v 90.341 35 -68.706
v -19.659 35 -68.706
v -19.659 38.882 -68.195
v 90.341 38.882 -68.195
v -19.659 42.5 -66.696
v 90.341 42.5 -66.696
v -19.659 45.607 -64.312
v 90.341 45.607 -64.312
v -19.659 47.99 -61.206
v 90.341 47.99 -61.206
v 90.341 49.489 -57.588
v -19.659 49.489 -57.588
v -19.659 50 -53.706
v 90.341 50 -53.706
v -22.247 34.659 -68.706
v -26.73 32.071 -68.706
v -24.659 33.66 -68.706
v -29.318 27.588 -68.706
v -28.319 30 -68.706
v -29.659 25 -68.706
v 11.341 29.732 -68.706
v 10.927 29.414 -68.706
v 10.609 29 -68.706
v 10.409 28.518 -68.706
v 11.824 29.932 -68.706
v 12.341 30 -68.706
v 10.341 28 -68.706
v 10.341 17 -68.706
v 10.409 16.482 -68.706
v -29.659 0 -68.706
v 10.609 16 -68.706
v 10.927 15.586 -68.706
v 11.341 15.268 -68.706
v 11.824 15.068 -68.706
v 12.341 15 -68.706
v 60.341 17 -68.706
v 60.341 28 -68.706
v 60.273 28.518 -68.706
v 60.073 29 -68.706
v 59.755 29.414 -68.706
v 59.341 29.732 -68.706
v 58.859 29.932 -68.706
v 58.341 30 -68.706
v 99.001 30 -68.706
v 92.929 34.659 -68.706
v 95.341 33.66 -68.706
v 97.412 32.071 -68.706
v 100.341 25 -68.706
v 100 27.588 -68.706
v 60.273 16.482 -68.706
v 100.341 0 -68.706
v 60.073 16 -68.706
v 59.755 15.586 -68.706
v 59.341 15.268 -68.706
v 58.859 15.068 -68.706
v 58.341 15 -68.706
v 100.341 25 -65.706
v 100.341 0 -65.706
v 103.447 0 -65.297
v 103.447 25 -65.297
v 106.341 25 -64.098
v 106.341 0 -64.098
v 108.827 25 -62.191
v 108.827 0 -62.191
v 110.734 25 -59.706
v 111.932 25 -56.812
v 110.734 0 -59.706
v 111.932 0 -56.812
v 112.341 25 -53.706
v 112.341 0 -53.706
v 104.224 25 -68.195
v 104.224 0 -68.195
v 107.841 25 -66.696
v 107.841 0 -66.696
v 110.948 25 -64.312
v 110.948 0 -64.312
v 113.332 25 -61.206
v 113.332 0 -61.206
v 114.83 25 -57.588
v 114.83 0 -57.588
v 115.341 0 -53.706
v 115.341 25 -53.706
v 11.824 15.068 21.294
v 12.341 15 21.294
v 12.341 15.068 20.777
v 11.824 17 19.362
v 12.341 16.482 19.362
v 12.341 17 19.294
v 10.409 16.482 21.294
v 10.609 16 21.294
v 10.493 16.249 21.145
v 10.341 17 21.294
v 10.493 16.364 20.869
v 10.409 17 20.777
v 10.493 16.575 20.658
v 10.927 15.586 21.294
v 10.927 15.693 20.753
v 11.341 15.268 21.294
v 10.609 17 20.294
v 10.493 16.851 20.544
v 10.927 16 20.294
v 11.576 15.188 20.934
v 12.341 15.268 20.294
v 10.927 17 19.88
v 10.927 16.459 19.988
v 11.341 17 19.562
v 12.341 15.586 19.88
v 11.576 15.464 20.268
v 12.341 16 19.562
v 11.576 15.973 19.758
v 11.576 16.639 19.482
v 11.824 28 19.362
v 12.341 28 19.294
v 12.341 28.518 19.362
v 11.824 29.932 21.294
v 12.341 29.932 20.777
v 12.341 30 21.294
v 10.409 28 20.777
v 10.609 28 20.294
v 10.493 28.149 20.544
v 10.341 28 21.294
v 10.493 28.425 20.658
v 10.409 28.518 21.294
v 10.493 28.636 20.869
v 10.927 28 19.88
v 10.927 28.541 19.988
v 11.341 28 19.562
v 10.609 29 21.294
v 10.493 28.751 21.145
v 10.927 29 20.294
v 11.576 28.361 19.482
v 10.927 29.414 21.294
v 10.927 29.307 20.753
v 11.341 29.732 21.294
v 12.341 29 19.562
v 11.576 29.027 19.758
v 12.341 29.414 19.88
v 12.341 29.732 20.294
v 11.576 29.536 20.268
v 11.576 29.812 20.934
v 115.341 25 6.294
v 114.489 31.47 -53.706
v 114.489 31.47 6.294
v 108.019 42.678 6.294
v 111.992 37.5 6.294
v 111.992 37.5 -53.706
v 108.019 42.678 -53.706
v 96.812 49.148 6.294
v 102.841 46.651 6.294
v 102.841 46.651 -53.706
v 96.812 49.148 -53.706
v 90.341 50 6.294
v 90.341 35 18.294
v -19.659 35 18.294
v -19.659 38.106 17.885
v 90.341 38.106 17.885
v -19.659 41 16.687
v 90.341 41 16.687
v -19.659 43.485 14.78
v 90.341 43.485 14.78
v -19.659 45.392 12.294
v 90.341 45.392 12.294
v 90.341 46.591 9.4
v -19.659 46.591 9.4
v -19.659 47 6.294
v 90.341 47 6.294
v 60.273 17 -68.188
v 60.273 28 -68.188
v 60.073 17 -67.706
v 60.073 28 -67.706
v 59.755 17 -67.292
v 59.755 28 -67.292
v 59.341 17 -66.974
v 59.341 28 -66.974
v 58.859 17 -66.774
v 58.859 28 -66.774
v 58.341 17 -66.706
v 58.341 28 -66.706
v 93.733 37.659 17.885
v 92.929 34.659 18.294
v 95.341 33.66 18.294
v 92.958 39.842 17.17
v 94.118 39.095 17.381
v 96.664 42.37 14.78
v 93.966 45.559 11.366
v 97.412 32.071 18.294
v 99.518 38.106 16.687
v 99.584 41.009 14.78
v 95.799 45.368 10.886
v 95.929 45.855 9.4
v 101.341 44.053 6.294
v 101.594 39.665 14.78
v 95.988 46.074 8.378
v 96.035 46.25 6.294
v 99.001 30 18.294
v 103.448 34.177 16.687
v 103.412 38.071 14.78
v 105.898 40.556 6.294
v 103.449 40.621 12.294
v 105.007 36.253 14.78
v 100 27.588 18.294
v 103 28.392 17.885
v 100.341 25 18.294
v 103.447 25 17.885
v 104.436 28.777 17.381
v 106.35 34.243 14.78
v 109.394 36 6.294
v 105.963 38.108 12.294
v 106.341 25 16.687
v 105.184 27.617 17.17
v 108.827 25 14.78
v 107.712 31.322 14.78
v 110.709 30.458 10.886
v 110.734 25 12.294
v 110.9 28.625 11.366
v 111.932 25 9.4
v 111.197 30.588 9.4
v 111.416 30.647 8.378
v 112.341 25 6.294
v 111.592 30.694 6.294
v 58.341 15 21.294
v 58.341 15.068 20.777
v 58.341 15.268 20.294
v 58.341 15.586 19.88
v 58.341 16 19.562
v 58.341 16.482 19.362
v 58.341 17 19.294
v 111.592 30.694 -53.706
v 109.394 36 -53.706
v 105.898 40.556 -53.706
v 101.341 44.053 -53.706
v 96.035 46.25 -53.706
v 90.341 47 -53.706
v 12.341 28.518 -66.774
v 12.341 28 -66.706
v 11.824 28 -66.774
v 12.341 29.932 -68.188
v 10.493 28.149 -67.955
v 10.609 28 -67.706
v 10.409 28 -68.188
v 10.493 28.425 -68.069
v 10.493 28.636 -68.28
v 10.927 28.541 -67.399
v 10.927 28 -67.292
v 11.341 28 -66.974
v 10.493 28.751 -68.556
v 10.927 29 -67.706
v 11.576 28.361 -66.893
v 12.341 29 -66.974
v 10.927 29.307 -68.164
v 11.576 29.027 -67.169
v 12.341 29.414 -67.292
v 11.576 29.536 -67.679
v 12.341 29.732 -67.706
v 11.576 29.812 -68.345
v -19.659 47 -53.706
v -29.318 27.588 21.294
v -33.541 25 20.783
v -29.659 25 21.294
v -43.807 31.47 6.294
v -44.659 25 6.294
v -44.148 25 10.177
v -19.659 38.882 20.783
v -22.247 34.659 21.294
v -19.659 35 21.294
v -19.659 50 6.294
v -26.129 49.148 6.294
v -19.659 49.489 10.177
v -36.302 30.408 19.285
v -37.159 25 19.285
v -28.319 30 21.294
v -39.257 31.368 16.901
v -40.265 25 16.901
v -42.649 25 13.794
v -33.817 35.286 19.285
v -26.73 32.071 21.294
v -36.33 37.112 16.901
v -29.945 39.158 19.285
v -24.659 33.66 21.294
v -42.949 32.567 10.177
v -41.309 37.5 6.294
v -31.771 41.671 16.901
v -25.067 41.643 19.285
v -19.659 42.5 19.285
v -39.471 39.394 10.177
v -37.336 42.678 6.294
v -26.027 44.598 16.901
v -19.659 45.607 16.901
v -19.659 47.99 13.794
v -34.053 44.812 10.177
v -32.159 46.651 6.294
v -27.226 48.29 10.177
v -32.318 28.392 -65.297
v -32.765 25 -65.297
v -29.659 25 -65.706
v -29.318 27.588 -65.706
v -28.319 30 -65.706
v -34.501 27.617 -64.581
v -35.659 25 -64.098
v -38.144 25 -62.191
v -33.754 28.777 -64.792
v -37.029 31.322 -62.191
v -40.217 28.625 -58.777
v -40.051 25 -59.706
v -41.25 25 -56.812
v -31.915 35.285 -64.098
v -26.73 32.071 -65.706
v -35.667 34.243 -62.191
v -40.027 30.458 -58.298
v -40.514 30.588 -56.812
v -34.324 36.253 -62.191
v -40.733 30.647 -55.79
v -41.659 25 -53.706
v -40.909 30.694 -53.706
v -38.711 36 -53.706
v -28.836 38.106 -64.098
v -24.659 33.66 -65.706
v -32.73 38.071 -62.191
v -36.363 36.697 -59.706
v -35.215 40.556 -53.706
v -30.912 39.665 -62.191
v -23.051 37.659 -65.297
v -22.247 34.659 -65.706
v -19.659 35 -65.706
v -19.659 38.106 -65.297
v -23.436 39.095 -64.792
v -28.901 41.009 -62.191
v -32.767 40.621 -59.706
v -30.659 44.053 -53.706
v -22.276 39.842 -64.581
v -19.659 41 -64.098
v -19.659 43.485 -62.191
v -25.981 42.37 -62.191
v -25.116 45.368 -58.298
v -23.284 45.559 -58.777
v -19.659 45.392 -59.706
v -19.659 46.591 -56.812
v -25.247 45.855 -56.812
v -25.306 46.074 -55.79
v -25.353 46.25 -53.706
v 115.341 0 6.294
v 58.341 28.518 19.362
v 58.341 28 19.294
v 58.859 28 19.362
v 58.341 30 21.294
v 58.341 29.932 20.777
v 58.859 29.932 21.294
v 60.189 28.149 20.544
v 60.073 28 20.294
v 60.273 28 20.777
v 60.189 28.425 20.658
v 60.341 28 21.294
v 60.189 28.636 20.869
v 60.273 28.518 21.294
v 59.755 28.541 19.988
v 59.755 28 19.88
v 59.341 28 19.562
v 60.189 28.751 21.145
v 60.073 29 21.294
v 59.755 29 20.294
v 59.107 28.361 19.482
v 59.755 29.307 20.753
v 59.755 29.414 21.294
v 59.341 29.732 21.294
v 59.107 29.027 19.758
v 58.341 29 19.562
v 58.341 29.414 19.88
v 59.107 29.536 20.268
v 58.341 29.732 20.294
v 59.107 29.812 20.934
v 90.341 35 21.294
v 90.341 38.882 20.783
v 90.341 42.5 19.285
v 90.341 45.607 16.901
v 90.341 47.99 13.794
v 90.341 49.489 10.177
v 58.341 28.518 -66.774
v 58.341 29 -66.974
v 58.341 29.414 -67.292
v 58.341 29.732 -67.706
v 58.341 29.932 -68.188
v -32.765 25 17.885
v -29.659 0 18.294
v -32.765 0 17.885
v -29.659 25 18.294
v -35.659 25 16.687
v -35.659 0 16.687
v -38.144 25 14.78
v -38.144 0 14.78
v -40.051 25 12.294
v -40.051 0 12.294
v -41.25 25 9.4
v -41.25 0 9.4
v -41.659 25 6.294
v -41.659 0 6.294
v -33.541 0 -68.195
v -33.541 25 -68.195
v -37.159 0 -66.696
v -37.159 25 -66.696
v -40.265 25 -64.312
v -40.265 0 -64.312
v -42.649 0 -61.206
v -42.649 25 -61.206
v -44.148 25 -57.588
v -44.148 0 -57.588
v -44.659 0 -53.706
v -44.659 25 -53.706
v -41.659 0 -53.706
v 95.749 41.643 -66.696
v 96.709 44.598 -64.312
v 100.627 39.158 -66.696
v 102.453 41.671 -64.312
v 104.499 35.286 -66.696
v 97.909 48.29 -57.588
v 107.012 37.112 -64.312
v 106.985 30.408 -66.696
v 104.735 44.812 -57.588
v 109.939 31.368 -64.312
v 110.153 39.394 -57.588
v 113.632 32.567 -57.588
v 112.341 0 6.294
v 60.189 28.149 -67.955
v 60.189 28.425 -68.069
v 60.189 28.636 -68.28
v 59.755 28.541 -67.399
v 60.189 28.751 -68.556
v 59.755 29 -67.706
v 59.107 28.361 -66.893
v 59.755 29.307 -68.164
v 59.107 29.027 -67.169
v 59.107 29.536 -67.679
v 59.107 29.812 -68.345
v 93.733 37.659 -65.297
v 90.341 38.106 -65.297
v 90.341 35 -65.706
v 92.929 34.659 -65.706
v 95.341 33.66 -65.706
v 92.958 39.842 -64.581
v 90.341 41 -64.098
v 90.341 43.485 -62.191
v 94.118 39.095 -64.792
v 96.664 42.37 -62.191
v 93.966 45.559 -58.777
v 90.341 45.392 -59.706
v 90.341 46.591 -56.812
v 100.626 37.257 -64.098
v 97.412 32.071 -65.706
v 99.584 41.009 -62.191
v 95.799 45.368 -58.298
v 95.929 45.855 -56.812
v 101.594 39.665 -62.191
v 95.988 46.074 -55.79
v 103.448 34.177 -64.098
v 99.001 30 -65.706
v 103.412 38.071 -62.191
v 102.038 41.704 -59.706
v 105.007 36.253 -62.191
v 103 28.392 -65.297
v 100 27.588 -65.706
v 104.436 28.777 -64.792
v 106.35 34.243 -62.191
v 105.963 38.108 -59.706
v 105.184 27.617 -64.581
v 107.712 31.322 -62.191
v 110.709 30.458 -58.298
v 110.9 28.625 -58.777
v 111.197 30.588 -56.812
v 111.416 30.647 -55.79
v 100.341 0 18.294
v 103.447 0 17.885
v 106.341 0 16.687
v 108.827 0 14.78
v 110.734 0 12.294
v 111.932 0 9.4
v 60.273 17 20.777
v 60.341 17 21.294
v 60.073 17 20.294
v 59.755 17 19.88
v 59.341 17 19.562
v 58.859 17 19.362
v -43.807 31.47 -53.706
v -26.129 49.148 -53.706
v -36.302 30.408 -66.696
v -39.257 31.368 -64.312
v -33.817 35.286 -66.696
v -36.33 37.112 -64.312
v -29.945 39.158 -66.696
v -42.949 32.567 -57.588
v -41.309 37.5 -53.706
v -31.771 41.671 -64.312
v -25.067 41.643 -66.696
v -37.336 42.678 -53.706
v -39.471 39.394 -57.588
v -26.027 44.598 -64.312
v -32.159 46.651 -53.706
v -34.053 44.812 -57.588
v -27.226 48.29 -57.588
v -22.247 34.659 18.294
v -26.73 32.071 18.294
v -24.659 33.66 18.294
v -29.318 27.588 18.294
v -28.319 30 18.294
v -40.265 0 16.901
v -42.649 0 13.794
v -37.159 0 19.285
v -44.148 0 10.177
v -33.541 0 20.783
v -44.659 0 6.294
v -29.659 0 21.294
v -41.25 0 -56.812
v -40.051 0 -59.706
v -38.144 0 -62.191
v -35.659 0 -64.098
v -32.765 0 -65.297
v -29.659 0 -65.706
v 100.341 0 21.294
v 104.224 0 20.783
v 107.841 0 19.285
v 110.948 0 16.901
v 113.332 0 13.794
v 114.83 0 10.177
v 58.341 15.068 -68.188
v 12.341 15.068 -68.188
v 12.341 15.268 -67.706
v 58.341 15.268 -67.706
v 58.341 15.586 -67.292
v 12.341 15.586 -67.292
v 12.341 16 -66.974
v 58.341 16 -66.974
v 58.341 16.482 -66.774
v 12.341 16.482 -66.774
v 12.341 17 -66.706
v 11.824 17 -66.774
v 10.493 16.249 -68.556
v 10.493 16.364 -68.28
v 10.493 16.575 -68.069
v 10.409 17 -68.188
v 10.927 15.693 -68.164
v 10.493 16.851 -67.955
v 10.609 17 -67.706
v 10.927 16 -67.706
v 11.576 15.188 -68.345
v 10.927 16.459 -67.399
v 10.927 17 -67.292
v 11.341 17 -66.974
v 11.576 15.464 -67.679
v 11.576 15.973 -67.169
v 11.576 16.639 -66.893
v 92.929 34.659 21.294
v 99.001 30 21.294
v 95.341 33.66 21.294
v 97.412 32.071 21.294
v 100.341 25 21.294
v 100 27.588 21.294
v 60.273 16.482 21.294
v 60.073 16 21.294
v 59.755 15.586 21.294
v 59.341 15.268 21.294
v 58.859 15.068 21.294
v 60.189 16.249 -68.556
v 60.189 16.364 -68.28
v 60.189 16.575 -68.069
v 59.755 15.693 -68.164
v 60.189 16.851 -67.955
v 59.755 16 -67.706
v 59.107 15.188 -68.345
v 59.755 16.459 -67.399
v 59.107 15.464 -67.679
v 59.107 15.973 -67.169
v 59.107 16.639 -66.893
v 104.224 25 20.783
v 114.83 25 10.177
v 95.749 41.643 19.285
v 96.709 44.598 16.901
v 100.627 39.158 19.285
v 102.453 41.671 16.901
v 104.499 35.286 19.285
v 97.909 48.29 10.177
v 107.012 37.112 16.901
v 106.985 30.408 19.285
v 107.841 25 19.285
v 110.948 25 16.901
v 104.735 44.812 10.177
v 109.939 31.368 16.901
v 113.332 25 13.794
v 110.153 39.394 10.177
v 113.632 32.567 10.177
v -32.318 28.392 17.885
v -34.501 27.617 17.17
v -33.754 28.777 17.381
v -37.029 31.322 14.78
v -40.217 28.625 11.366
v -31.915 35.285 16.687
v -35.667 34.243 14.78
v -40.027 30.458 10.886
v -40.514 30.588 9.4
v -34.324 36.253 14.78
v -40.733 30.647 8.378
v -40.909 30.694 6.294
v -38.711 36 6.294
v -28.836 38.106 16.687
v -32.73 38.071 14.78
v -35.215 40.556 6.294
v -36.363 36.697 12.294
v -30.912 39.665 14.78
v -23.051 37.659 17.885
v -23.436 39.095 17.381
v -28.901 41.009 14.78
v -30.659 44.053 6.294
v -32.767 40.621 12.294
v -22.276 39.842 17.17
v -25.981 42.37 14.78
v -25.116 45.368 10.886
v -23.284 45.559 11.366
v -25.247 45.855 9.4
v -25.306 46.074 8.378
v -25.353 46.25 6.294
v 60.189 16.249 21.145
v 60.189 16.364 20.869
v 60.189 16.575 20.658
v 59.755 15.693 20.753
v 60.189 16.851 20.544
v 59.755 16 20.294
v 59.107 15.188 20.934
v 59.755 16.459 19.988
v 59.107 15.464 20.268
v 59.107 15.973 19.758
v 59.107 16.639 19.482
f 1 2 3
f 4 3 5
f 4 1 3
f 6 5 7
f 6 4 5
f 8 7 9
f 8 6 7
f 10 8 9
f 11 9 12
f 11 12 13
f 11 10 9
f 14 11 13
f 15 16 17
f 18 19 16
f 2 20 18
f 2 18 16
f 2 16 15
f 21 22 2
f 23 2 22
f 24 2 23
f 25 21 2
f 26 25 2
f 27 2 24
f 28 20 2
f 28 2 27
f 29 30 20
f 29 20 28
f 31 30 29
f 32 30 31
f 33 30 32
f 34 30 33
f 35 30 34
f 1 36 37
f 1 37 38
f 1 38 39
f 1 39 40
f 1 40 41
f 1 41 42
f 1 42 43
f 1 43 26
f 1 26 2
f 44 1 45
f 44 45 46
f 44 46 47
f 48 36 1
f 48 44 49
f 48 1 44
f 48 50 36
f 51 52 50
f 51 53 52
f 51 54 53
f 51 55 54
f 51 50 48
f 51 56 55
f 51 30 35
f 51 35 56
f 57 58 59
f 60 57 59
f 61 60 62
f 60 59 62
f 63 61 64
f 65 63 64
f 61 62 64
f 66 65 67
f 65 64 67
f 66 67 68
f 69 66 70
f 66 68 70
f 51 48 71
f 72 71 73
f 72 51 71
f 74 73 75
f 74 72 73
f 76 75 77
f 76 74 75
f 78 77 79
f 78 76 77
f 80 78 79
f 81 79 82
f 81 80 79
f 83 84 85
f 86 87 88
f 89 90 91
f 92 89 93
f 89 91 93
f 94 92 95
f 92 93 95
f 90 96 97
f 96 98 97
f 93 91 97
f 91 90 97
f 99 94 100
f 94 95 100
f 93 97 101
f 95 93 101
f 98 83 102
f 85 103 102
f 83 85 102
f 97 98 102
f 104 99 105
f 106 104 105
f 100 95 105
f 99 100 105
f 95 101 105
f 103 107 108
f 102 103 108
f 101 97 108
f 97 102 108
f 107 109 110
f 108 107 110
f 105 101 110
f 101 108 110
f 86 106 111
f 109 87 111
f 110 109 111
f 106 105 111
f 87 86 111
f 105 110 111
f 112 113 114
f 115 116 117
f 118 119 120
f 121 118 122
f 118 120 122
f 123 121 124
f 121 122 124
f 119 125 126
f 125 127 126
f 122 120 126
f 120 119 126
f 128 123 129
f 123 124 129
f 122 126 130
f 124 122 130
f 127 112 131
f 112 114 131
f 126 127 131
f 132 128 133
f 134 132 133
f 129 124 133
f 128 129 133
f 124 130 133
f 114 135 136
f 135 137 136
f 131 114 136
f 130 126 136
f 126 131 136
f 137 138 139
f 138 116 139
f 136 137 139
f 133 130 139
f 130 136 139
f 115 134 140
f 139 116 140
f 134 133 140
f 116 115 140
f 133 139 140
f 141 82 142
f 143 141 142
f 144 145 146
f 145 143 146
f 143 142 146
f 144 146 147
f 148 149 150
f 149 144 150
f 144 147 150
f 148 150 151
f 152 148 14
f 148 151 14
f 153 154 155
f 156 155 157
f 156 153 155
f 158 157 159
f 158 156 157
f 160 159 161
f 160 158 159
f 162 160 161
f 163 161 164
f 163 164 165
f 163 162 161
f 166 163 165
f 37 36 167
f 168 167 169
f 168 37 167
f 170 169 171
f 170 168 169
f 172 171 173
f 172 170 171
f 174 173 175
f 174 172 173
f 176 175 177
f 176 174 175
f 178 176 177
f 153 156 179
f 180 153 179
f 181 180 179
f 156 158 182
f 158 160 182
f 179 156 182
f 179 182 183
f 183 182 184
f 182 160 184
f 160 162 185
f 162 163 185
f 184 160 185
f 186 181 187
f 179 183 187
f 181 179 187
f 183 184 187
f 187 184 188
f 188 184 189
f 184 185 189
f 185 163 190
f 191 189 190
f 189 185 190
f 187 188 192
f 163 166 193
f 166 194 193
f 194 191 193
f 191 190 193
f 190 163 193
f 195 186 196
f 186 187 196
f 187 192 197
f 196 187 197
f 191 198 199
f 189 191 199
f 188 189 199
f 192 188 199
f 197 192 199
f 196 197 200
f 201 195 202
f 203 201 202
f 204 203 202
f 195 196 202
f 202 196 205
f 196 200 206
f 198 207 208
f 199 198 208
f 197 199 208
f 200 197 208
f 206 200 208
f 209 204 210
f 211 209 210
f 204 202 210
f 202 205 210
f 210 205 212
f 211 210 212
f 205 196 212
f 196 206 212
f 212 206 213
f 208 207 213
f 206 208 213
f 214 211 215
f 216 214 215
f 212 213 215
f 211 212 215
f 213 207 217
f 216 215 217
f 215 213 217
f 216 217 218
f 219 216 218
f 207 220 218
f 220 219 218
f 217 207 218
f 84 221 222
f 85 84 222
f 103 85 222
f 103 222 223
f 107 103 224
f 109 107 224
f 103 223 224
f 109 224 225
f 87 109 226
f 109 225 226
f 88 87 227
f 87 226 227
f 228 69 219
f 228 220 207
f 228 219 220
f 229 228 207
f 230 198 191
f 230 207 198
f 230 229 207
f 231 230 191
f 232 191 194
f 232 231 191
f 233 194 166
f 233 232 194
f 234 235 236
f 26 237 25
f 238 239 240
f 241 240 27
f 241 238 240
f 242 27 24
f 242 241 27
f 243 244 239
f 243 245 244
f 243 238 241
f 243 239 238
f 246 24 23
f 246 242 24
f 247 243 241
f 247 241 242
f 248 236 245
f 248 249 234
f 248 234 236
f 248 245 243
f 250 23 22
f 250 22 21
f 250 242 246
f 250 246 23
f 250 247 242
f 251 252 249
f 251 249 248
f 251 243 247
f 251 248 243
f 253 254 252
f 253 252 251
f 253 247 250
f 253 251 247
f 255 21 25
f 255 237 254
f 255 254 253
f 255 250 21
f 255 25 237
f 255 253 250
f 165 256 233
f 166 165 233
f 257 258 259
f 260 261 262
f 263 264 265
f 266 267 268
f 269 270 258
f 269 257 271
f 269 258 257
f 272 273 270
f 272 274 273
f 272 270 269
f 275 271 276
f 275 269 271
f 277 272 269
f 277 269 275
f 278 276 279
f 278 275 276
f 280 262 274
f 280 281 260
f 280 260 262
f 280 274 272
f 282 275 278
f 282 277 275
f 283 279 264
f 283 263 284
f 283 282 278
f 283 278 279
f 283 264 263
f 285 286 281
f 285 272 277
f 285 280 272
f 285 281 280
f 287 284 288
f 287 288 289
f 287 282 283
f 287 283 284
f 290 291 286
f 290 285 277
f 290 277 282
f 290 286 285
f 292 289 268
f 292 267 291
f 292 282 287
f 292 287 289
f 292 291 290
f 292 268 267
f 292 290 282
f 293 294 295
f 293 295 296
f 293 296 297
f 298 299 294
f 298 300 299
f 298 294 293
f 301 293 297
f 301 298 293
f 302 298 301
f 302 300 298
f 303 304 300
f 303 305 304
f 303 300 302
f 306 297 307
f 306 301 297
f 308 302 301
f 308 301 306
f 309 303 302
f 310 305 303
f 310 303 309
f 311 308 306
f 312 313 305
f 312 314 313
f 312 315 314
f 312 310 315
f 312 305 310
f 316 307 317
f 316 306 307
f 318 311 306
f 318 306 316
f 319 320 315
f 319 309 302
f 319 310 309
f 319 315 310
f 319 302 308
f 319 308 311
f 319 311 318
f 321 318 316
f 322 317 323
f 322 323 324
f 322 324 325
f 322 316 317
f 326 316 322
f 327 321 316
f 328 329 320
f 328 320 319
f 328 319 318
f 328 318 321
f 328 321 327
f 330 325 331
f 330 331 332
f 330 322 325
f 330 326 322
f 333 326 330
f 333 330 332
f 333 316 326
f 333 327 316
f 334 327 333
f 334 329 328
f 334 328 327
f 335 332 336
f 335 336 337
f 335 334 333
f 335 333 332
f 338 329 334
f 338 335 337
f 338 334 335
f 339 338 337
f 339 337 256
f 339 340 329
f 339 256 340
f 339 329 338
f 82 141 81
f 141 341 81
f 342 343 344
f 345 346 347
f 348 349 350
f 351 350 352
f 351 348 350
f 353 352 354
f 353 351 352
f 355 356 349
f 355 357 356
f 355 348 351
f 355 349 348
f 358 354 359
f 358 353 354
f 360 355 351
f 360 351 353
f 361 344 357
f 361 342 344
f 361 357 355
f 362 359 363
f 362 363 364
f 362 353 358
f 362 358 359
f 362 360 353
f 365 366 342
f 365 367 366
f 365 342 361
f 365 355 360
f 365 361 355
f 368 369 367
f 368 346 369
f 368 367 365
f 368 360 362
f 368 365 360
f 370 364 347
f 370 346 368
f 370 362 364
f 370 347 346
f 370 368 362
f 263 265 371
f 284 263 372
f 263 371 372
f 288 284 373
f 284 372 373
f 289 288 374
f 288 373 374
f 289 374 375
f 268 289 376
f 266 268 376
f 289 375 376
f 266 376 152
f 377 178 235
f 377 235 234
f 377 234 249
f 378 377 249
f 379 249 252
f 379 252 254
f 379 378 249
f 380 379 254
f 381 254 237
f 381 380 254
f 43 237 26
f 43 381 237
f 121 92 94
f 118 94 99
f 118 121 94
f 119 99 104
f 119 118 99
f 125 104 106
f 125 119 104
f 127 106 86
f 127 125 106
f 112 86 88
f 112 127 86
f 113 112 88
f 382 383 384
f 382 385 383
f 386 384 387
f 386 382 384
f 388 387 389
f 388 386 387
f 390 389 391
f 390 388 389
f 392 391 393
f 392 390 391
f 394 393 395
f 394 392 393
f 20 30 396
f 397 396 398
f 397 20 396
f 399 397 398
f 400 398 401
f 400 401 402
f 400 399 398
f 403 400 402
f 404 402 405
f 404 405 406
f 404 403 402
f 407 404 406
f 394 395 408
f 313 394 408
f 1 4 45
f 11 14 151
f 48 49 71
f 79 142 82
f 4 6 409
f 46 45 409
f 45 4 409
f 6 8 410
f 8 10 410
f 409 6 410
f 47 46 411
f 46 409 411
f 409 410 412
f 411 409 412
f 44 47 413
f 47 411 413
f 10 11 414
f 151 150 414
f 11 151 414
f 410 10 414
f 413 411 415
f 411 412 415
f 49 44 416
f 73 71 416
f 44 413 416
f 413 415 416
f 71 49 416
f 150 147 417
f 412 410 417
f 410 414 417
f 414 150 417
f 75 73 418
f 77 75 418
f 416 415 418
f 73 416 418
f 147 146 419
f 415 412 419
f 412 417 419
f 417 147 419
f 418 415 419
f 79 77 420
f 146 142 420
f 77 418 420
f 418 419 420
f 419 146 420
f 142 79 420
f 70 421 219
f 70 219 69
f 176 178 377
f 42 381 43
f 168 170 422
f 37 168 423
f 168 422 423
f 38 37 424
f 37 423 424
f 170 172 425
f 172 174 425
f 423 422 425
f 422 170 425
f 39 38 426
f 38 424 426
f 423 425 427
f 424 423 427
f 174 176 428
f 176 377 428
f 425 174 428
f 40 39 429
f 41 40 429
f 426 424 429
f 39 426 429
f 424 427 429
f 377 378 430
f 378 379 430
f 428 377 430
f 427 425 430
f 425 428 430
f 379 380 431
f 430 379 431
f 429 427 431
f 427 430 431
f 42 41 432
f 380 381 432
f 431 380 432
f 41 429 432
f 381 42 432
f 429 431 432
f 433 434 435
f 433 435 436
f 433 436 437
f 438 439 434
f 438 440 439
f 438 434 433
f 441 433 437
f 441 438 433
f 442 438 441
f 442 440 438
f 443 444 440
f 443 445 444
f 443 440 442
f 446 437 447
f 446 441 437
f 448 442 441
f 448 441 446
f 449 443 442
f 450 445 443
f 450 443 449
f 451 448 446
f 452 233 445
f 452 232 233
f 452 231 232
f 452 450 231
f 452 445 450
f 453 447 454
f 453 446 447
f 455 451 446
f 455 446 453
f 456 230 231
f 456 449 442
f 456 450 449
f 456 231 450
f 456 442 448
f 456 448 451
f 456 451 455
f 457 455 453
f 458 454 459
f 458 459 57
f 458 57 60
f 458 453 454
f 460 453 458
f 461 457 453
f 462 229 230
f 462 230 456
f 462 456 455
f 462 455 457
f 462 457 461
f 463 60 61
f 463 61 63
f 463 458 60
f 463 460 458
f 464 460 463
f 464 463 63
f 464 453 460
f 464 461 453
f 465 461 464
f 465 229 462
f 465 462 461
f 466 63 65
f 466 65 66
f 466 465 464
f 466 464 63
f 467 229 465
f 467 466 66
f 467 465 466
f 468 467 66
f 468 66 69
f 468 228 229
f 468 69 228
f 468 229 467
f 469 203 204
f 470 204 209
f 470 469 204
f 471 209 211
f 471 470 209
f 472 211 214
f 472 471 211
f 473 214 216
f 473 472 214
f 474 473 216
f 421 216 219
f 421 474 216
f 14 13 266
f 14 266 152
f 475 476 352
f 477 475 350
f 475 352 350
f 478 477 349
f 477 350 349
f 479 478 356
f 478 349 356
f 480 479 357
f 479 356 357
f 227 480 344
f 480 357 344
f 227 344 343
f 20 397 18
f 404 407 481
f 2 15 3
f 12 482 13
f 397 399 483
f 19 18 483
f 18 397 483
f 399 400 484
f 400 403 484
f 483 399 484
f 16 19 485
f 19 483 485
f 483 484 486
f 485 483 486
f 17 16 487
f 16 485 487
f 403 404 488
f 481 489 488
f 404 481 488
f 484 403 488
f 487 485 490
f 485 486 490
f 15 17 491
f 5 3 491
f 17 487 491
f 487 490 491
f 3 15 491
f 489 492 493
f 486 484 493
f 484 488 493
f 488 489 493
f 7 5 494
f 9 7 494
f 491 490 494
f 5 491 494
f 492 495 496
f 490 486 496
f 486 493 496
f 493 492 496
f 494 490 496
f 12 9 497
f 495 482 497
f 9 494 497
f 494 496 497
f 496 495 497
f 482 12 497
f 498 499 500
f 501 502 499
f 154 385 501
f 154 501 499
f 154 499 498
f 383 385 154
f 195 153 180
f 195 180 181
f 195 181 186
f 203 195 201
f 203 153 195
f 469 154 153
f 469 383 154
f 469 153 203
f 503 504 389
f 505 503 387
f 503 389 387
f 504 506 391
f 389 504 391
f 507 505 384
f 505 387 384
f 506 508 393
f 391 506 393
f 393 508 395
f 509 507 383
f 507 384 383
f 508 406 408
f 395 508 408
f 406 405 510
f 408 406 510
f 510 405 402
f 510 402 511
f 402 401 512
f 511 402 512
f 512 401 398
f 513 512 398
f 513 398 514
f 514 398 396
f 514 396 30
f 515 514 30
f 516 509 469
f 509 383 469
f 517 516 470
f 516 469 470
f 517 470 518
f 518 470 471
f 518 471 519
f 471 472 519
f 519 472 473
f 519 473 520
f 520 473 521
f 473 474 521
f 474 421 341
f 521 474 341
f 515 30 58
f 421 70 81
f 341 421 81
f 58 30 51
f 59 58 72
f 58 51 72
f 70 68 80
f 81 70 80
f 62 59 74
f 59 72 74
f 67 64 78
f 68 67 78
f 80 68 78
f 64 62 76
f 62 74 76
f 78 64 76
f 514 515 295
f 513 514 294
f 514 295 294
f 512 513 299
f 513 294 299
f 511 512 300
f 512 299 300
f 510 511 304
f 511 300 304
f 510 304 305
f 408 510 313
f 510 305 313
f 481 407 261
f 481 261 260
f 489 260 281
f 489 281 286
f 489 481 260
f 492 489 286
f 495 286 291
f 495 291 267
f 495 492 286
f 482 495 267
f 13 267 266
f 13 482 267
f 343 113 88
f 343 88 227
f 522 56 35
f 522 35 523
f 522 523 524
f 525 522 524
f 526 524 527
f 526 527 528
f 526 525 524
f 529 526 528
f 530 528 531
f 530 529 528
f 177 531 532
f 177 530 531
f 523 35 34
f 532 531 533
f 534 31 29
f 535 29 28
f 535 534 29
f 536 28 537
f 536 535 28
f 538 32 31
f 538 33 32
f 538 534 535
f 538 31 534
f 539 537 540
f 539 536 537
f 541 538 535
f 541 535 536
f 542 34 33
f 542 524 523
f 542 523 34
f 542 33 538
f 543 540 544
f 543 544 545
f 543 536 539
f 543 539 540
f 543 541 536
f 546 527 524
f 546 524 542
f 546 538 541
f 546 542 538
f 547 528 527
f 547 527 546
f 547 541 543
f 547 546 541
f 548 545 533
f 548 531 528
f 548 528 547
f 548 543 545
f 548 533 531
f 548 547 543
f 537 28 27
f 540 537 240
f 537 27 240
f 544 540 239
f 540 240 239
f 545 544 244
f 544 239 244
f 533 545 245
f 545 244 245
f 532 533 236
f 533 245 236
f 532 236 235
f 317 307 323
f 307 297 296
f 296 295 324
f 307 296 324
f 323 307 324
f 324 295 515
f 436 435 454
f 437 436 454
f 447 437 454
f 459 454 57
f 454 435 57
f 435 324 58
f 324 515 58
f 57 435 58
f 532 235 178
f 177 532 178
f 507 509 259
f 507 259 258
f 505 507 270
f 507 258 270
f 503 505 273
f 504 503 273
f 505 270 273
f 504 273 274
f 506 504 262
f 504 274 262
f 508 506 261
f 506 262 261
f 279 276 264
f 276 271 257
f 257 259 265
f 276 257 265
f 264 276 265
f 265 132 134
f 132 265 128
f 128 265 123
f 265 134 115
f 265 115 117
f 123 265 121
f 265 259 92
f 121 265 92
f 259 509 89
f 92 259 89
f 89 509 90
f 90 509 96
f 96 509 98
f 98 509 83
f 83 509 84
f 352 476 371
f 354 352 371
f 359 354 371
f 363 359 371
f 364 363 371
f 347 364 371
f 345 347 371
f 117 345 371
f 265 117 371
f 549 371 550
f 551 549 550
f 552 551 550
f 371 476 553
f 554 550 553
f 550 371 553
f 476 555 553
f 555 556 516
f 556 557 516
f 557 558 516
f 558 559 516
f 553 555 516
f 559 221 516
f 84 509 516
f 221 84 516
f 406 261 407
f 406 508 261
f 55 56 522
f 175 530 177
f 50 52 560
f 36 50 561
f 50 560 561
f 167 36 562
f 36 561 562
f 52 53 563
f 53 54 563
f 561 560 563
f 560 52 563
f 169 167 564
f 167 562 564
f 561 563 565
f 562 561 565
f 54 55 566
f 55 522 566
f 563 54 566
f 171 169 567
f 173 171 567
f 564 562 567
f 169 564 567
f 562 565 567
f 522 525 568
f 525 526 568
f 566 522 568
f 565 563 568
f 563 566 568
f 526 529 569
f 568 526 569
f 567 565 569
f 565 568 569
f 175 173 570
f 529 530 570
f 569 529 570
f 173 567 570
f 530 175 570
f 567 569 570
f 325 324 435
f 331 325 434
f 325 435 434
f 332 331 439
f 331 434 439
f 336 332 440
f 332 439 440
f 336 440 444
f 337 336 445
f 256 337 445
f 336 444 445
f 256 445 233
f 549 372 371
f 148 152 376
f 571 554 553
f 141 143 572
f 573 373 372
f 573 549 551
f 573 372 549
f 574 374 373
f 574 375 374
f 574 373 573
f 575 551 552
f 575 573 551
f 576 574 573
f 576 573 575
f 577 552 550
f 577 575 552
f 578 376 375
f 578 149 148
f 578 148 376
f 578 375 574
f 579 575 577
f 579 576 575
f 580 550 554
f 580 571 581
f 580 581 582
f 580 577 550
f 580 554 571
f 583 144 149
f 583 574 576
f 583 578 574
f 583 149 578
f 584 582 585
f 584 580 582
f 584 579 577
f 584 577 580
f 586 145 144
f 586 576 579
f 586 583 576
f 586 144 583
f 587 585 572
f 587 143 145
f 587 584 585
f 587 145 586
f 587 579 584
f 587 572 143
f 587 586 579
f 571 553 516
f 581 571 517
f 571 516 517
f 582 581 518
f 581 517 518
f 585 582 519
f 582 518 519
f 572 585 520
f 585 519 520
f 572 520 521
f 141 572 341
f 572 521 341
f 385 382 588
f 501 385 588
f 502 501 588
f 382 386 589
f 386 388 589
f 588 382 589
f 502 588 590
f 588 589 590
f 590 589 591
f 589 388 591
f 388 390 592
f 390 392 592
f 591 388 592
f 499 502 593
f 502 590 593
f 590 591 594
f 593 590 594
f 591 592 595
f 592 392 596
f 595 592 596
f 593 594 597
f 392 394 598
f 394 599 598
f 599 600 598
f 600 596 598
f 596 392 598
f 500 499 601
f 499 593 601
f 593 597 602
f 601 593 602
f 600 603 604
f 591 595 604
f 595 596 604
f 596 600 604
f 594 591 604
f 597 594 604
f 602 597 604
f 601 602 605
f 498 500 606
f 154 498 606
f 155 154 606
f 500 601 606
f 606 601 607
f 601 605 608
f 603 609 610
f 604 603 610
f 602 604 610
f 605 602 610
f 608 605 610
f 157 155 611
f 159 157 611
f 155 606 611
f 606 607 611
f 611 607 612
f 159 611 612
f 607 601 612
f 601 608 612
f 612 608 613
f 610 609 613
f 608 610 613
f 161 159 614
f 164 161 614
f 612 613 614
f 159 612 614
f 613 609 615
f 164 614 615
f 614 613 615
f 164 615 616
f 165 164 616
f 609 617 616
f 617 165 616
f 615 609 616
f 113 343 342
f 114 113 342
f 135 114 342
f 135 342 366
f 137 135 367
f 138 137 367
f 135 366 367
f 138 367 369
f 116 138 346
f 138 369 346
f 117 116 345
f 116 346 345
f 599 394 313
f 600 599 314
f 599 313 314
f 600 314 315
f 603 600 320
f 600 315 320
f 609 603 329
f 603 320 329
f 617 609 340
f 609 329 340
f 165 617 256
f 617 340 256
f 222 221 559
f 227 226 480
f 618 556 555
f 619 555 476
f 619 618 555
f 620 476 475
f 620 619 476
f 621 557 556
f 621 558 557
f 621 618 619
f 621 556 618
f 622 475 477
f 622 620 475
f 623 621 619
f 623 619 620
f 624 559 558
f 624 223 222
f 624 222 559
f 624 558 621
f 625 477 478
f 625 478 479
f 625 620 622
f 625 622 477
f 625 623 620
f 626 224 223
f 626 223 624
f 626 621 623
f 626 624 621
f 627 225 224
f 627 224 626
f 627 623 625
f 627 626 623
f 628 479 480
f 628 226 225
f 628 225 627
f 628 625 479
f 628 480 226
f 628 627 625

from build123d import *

# Parameters (mm, degrees)
ESQUISSE1_W             = 160
ESQUISSE1_H             = 90
EXTRUSION1_DEPTH        = 50
CONG_1_R                = 25
CONG_2_R                = 15
COQUE1_T                = -3
ESQUISSE2_W             = 50
ESQUISSE2_H             = 15
ENL_V_MAT_EXTRU_1_DEPTH = 2
CONG_4_R                = 2
CONG_5_R                = 2
CONG_6_R                = 2
CONG_7_R                = 2
CONG_4_OF_SYM_TRIE1_R   = 2
CONG_5_OF_SYM_TRIE1_R   = 2
CONG_6_OF_SYM_TRIE1_R   = 2
CONG_7_OF_SYM_TRIE1_R   = 2


with BuildPart() as part:
    # Esquisse1 → Extrusion1 (new body)
    with BuildSketch(Plane(origin=(0, 0, 0), x_dir=(1, 0, 0), z_dir=(0, 1, 0))):
        with Locations((35.341232877, 23.705753425)):
            Rectangle(ESQUISSE1_W, ESQUISSE1_H)
    extrude(amount=EXTRUSION1_DEPTH)

    # Congé1
    cong_1_edges = [part.edges().sort_by_distance(p)[0] for p in [
        (115.341232877, 50, -23.705753425),
        (-44.658767123, 50, -23.705753425),
    ]]
    fillet(cong_1_edges, radius=CONG_1_R)

    # Congé2
    cong_2_edges = [part.edges().sort_by_distance(p)[0] for p in [
        (35.341232877, 50, 21.294246575),
        (35.341232877, 50, -68.705753425),
        (115.341232877, 12.5, 21.294246575),
        (-44.658767123, 12.5, 21.294246575),
        (108.018902406, 42.67766953, 21.294246575),
        (-37.336436653, 42.67766953, 21.294246575),
        (-44.658767123, 12.5, -68.705753425),
        (115.341232877, 12.5, -68.705753425),
        (108.018902406, 42.67766953, -68.705753425),
        (-37.336436653, 42.67766953, -68.705753425),
    ]]
    fillet(cong_2_edges, radius=CONG_2_R)

    # Coque1
    coque1_openings = [part.faces().sort_by_distance(p)[0] for p in [
        (35.341232877, 0, -23.705753425),
    ]]
    offset(amount=COQUE1_T, openings=coque1_openings, kind=Kind.INTERSECTION)

    # Esquisse2 → Enlèv. mat.-Extru.1 (cut)
    with BuildSketch(Plane.XY.offset(21.294246575)):
        with Locations((35.341232877, 22.5)):
            Rectangle(ESQUISSE2_W, ESQUISSE2_H)
    enl_v_mat_extru_1 = extrude(amount=-ENL_V_MAT_EXTRU_1_DEPTH, mode=Mode.SUBTRACT)

    # Congé4
    cong_4_edges = [part.edges().sort_by_distance(p)[0] for p in [
        (35.341232877, 15, 19.294246575),
    ]]
    fillet(cong_4_edges, radius=CONG_4_R - 0.0001)  # a hair under: the kernel refuses the full size

    # Congé5
    cong_5_edges = [part.edges().sort_by_distance(p)[0] for p in [
        (35.341232877, 30, 19.294246575),
    ]]
    fillet(cong_5_edges, radius=CONG_5_R - 0.0001)  # a hair under: the kernel refuses the full size

    # Congé6
    cong_6_edges = [part.edges().sort_by_distance(p)[0] for p in [
        (10.341232877, 15.585757148, 19.880003724),
        (10.341232877, 22.5, 19.294246575),
        (10.341232877, 29.414242852, 19.880003724),
    ]]
    fillet(cong_6_edges, radius=CONG_6_R - 0.0001)  # a hair under: the kernel refuses the full size

    # Congé7
    cong_7_edges = [part.edges().sort_by_distance(p)[0] for p in [
        (60.341232877, 22.5, 19.294246575),
        (60.341232877, 15.585757148, 19.880003724),
        (60.341232877, 29.414242852, 19.880003724),
    ]]
    fillet(cong_7_edges, radius=CONG_7_R - 0.0001)  # a hair under: the kernel refuses the full size

    # Symétrie1: Enlèv. mat.-Extru.1 across plane
    add(enl_v_mat_extru_1.mirror(Plane.XY.offset(-23.705753425)), mode=Mode.SUBTRACT)

    # Congé4 of Symétrie1
    cong_4_of_sym_trie1_edges = [part.edges().sort_by_distance(p)[0] for p in [
        (35.341232877, 15, -66.705753425),
    ]]
    fillet(cong_4_of_sym_trie1_edges, radius=CONG_4_OF_SYM_TRIE1_R - 0.0001)  # a hair under: the kernel refuses the full size

    # Congé5 of Symétrie1
    cong_5_of_sym_trie1_edges = [part.edges().sort_by_distance(p)[0] for p in [
        (35.341232877, 30, -66.705753425),
    ]]
    fillet(cong_5_of_sym_trie1_edges, radius=CONG_5_OF_SYM_TRIE1_R - 0.0001)  # a hair under: the kernel refuses the full size

    # Congé6 of Symétrie1
    cong_6_of_sym_trie1_edges = [part.edges().sort_by_distance(p)[0] for p in [
        (10.341232877, 15.585757148, -67.291510573),
        (10.341232877, 22.5, -66.705753425),
        (10.341232877, 29.414242852, -67.291510573),
    ]]
    fillet(cong_6_of_sym_trie1_edges, radius=CONG_6_OF_SYM_TRIE1_R - 0.0001)  # a hair under: the kernel refuses the full size

    # Congé7 of Symétrie1
    cong_7_of_sym_trie1_edges = [part.edges().sort_by_distance(p)[0] for p in [
        (60.341232877, 22.5, -66.705753425),
        (60.341232877, 15.585757148, -67.291510573),
        (60.341232877, 29.414242852, -67.291510573),
    ]]
    fillet(cong_7_of_sym_trie1_edges, radius=CONG_7_OF_SYM_TRIE1_R - 0.0001)  # a hair under: the kernel refuses the full size


solid = part.part
